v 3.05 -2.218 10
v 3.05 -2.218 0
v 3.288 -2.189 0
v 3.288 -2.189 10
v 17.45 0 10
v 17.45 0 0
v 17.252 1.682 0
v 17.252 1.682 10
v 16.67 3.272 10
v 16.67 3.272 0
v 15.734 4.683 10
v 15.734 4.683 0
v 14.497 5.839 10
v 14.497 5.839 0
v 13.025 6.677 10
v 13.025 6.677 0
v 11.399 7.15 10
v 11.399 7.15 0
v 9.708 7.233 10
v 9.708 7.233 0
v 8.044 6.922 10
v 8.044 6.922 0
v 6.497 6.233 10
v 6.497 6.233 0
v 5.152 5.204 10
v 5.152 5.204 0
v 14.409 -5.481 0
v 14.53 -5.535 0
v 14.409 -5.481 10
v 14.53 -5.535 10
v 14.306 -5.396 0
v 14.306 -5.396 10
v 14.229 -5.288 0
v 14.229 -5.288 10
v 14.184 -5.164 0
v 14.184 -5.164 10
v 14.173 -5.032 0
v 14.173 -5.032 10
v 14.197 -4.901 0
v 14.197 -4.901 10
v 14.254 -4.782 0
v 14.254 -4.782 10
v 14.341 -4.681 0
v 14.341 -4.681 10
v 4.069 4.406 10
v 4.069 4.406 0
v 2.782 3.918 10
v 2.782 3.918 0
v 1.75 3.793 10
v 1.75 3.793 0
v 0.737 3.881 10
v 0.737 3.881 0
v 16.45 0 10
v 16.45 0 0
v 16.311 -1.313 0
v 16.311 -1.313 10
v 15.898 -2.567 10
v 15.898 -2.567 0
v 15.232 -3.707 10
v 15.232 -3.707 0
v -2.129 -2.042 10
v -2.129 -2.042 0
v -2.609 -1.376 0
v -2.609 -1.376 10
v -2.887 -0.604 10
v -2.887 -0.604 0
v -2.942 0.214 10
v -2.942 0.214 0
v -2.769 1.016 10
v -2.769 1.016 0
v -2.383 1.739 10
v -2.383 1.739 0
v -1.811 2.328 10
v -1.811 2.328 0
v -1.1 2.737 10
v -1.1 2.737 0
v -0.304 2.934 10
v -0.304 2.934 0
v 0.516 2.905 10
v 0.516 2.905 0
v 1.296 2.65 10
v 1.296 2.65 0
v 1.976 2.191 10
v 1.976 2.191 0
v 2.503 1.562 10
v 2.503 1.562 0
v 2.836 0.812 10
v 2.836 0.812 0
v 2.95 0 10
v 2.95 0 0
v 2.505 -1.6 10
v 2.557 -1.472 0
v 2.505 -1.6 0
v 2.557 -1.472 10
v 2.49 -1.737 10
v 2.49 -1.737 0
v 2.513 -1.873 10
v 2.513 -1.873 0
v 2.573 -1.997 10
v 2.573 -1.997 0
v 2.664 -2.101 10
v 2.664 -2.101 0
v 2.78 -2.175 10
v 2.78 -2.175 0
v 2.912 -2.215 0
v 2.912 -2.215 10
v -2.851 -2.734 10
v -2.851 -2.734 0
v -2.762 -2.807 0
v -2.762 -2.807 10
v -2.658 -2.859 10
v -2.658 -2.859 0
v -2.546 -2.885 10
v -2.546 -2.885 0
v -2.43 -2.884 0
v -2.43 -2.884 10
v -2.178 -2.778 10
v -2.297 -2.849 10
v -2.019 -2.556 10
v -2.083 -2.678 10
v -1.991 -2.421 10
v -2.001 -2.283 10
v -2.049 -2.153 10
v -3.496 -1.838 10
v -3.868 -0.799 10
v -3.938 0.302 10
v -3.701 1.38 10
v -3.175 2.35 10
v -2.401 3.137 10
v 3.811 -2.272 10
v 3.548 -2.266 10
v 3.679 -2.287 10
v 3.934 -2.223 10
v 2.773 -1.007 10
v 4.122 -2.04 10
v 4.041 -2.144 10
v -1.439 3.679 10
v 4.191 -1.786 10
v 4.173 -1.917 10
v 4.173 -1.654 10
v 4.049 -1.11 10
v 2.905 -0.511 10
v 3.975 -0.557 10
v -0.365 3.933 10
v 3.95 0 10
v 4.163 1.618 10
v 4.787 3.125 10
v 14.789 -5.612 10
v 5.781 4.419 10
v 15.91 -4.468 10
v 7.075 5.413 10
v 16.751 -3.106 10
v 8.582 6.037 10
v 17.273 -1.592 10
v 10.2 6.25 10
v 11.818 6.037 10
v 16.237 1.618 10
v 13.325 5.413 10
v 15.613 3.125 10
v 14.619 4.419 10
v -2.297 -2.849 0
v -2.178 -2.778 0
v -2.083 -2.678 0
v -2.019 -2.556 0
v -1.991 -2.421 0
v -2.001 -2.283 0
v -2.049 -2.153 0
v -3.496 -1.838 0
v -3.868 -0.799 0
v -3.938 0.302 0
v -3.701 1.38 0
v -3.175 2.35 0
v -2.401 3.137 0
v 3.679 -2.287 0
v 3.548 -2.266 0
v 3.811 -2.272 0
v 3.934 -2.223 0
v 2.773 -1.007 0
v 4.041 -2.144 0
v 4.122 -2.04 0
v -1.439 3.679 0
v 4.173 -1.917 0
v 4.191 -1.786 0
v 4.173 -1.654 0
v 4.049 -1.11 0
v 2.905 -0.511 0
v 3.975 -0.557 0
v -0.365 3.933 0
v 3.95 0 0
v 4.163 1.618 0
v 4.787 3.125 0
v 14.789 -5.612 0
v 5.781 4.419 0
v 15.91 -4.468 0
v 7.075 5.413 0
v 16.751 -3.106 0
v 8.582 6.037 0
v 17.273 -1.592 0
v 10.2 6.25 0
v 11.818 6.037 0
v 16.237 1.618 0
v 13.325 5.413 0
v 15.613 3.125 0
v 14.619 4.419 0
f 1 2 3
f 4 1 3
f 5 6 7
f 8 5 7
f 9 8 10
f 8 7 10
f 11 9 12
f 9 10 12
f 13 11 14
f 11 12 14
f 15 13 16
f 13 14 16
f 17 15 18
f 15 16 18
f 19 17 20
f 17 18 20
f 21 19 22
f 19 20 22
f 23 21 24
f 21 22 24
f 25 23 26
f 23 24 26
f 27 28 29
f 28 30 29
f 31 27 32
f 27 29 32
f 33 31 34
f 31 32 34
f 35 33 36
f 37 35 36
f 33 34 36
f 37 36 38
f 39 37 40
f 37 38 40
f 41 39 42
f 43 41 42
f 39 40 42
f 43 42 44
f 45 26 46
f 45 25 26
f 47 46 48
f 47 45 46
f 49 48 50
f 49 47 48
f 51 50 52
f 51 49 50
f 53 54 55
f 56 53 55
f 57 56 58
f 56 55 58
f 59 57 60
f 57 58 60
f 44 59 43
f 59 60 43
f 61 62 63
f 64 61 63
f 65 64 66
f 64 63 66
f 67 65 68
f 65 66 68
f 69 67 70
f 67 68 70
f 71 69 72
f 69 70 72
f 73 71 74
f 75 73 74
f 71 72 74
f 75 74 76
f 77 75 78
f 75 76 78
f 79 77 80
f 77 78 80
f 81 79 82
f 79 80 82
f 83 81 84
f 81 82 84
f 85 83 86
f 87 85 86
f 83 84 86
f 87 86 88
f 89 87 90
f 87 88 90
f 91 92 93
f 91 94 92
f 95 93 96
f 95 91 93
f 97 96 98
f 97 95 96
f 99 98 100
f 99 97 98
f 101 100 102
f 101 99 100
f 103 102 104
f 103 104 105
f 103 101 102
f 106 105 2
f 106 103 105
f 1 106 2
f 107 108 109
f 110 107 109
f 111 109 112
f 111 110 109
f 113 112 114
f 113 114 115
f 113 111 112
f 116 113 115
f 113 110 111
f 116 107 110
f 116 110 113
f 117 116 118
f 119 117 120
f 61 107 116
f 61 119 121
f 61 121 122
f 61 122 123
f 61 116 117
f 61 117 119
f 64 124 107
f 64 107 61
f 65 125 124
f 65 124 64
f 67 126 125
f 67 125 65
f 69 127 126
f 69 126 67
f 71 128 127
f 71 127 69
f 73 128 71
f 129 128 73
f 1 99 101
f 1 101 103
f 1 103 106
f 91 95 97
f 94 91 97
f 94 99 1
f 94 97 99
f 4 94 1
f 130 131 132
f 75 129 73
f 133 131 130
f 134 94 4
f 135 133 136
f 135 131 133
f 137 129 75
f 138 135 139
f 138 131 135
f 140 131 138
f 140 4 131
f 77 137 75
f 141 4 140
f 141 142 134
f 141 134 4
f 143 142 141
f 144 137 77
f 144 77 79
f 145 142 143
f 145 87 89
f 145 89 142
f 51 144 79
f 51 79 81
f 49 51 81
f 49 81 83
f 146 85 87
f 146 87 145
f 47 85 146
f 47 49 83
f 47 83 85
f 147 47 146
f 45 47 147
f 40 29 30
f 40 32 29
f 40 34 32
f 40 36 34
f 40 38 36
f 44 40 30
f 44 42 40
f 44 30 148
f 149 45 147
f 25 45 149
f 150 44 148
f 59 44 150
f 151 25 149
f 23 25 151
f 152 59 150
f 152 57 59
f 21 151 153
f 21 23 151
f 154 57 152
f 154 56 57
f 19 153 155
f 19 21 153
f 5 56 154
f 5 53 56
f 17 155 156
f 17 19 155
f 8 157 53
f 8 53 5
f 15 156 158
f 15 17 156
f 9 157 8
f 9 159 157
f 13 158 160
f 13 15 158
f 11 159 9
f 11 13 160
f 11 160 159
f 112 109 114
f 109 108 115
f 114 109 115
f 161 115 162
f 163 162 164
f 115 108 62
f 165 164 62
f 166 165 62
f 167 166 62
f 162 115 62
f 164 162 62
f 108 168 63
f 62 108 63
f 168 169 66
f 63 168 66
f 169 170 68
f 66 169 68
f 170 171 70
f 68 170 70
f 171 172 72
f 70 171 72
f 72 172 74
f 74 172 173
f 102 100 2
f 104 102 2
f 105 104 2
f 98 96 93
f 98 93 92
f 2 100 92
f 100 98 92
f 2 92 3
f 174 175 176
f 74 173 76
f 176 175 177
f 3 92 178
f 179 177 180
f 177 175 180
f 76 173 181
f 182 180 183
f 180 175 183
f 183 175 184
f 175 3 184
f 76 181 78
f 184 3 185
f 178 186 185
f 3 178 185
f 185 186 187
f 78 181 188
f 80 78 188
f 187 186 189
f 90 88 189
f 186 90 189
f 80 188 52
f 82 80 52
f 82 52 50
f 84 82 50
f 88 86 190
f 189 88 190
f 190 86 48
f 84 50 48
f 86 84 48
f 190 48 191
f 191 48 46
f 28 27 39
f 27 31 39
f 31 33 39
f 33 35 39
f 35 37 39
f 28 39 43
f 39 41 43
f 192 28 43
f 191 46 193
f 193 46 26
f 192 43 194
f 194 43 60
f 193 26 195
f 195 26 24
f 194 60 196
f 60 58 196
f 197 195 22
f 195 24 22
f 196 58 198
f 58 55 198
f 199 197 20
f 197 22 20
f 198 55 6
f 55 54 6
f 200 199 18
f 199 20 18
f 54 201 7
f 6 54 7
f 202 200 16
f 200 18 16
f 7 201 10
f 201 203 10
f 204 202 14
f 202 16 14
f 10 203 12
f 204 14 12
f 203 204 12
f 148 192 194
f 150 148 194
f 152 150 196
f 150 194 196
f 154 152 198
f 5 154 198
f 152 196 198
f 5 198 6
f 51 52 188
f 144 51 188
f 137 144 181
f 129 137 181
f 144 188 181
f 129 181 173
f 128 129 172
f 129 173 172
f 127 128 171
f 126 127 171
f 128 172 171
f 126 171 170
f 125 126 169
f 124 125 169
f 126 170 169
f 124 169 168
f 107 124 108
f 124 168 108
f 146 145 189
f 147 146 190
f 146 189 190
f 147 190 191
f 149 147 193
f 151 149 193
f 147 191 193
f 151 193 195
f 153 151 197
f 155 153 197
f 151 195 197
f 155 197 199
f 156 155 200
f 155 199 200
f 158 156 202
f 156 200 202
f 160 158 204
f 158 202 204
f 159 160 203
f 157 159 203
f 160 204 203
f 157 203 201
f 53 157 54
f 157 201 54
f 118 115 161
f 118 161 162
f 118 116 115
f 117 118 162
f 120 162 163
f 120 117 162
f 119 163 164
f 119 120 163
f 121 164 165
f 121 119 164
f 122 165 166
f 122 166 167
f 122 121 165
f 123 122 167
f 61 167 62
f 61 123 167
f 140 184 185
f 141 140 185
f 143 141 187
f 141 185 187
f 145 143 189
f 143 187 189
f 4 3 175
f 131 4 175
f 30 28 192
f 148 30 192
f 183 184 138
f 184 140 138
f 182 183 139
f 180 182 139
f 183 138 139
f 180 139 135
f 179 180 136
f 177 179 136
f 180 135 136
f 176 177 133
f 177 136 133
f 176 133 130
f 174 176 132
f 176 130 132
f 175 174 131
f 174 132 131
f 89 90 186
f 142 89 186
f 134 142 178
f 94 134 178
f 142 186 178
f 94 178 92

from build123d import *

# Parameters (mm, degrees)
F1_DEPTH = 10
F2_R     = 5
F3_R     = 0.49999


# Not quite as in the source:
# - a fillet or chamfer is up to 0.001 mm smaller than in the source, because OpenCascade refuses the exact size


with BuildPart() as f1:
    # F0 (on Top) → F1 (new body)
    with BuildSketch(Plane.XY):
        with BuildLine():
            ThreePointArc((-1.1283685941, -2.7256713514), (-1.6391785515, 2.4526707232), (2.95, 0))
            ThreePointArc((2.95, 0), (3.035057777, 1.107295327), (3.2882352941, 2.1886088391))
            ThreePointArc((3.2882352941, 2.1886088391), (-2.5695330315, 3), (-2.6678904245, -2.9128784188))
            Line((-2.6678904245, -2.9128784188), (-1.1283685941, -2.7256713514))
        make_face()
        with BuildLine():
            ThreePointArc((3.2882352941, 2.1886088391), (3.035057777, 1.107295327), (2.95, 0))
            ThreePointArc((2.95, 0), (3.035057777, -1.107295327), (3.2882352941, -2.1886088391))
            ThreePointArc((3.2882352941, -2.1886088391), (3.7809409815, -1.1432345753), (3.95, 0))
            ThreePointArc((3.95, 0), (3.7809409815, 1.1432345753), (3.2882352941, 2.1886088391))
        make_face()
        with BuildLine():
            ThreePointArc((3.2882352941, -2.1886088391), (3.035057777, -1.107295327), (2.95, 0))
            ThreePointArc((2.95, 0), (2.6326037224, -1.3311264557), (1.7487134637, -2.3758159065))
            Line((1.7487134637, -2.3758159065), (3.2882352941, -2.1886088391))
        make_face()
        with BuildLine():
            ThreePointArc((3.95, 0), (3.7809409815, -1.1432345753), (3.2882352941, -2.1886088391))
            Line((3.2882352941, -2.1886088391), (4.4925851142, -2.5471386536))
            ThreePointArc((4.4925851142, -2.5471386536), (4.0871511128, -1.3021438023), (3.95, 0))
        make_face()
        with BuildLine():
            ThreePointArc((17.45, 0), (11.307295327, 7.164942223), (3.2882352941, 2.1886088391))
            ThreePointArc((3.2882352941, 2.1886088391), (3.7809409815, 1.1432345753), (3.95, 0))
            ThreePointArc((3.95, 0), (10.2, 6.25), (16.45, 0))
            ThreePointArc((16.45, 0), (15.6872207282, -2.9921411532), (13.5850692222, -5.2539324663))
            Line((13.5850692222, -5.2539324663), (14.7894190423, -5.6124622809))
            ThreePointArc((14.7894190423, -5.6124622809), (16.7511750113, -3.1055765925), (17.45, 0))
        make_face()
    extrude(amount=F1_DEPTH)

    # F2
    f2_edges = [f1.edges().sort_by_distance(p)[0] for p in [
        (3.288235, 2.188609, 5),
    ]]
    fillet(f2_edges, radius=F2_R)

    # F3 (radius 0.5 in the source; OpenCascade refuses exactly that, so slightly less here)
    f3_edges = [f1.edges().sort_by_distance(p)[0] for p in [
        (-1.128369, -2.725671, 5),
        (1.748713, -2.375816, 5),
        (4.492585, -2.547139, 5),
        (13.585069, -5.253932, 5),
        (-2.66789, -2.912878, 5),
    ]]
    fillet(f3_edges, radius=F3_R)


solid = f1.part
